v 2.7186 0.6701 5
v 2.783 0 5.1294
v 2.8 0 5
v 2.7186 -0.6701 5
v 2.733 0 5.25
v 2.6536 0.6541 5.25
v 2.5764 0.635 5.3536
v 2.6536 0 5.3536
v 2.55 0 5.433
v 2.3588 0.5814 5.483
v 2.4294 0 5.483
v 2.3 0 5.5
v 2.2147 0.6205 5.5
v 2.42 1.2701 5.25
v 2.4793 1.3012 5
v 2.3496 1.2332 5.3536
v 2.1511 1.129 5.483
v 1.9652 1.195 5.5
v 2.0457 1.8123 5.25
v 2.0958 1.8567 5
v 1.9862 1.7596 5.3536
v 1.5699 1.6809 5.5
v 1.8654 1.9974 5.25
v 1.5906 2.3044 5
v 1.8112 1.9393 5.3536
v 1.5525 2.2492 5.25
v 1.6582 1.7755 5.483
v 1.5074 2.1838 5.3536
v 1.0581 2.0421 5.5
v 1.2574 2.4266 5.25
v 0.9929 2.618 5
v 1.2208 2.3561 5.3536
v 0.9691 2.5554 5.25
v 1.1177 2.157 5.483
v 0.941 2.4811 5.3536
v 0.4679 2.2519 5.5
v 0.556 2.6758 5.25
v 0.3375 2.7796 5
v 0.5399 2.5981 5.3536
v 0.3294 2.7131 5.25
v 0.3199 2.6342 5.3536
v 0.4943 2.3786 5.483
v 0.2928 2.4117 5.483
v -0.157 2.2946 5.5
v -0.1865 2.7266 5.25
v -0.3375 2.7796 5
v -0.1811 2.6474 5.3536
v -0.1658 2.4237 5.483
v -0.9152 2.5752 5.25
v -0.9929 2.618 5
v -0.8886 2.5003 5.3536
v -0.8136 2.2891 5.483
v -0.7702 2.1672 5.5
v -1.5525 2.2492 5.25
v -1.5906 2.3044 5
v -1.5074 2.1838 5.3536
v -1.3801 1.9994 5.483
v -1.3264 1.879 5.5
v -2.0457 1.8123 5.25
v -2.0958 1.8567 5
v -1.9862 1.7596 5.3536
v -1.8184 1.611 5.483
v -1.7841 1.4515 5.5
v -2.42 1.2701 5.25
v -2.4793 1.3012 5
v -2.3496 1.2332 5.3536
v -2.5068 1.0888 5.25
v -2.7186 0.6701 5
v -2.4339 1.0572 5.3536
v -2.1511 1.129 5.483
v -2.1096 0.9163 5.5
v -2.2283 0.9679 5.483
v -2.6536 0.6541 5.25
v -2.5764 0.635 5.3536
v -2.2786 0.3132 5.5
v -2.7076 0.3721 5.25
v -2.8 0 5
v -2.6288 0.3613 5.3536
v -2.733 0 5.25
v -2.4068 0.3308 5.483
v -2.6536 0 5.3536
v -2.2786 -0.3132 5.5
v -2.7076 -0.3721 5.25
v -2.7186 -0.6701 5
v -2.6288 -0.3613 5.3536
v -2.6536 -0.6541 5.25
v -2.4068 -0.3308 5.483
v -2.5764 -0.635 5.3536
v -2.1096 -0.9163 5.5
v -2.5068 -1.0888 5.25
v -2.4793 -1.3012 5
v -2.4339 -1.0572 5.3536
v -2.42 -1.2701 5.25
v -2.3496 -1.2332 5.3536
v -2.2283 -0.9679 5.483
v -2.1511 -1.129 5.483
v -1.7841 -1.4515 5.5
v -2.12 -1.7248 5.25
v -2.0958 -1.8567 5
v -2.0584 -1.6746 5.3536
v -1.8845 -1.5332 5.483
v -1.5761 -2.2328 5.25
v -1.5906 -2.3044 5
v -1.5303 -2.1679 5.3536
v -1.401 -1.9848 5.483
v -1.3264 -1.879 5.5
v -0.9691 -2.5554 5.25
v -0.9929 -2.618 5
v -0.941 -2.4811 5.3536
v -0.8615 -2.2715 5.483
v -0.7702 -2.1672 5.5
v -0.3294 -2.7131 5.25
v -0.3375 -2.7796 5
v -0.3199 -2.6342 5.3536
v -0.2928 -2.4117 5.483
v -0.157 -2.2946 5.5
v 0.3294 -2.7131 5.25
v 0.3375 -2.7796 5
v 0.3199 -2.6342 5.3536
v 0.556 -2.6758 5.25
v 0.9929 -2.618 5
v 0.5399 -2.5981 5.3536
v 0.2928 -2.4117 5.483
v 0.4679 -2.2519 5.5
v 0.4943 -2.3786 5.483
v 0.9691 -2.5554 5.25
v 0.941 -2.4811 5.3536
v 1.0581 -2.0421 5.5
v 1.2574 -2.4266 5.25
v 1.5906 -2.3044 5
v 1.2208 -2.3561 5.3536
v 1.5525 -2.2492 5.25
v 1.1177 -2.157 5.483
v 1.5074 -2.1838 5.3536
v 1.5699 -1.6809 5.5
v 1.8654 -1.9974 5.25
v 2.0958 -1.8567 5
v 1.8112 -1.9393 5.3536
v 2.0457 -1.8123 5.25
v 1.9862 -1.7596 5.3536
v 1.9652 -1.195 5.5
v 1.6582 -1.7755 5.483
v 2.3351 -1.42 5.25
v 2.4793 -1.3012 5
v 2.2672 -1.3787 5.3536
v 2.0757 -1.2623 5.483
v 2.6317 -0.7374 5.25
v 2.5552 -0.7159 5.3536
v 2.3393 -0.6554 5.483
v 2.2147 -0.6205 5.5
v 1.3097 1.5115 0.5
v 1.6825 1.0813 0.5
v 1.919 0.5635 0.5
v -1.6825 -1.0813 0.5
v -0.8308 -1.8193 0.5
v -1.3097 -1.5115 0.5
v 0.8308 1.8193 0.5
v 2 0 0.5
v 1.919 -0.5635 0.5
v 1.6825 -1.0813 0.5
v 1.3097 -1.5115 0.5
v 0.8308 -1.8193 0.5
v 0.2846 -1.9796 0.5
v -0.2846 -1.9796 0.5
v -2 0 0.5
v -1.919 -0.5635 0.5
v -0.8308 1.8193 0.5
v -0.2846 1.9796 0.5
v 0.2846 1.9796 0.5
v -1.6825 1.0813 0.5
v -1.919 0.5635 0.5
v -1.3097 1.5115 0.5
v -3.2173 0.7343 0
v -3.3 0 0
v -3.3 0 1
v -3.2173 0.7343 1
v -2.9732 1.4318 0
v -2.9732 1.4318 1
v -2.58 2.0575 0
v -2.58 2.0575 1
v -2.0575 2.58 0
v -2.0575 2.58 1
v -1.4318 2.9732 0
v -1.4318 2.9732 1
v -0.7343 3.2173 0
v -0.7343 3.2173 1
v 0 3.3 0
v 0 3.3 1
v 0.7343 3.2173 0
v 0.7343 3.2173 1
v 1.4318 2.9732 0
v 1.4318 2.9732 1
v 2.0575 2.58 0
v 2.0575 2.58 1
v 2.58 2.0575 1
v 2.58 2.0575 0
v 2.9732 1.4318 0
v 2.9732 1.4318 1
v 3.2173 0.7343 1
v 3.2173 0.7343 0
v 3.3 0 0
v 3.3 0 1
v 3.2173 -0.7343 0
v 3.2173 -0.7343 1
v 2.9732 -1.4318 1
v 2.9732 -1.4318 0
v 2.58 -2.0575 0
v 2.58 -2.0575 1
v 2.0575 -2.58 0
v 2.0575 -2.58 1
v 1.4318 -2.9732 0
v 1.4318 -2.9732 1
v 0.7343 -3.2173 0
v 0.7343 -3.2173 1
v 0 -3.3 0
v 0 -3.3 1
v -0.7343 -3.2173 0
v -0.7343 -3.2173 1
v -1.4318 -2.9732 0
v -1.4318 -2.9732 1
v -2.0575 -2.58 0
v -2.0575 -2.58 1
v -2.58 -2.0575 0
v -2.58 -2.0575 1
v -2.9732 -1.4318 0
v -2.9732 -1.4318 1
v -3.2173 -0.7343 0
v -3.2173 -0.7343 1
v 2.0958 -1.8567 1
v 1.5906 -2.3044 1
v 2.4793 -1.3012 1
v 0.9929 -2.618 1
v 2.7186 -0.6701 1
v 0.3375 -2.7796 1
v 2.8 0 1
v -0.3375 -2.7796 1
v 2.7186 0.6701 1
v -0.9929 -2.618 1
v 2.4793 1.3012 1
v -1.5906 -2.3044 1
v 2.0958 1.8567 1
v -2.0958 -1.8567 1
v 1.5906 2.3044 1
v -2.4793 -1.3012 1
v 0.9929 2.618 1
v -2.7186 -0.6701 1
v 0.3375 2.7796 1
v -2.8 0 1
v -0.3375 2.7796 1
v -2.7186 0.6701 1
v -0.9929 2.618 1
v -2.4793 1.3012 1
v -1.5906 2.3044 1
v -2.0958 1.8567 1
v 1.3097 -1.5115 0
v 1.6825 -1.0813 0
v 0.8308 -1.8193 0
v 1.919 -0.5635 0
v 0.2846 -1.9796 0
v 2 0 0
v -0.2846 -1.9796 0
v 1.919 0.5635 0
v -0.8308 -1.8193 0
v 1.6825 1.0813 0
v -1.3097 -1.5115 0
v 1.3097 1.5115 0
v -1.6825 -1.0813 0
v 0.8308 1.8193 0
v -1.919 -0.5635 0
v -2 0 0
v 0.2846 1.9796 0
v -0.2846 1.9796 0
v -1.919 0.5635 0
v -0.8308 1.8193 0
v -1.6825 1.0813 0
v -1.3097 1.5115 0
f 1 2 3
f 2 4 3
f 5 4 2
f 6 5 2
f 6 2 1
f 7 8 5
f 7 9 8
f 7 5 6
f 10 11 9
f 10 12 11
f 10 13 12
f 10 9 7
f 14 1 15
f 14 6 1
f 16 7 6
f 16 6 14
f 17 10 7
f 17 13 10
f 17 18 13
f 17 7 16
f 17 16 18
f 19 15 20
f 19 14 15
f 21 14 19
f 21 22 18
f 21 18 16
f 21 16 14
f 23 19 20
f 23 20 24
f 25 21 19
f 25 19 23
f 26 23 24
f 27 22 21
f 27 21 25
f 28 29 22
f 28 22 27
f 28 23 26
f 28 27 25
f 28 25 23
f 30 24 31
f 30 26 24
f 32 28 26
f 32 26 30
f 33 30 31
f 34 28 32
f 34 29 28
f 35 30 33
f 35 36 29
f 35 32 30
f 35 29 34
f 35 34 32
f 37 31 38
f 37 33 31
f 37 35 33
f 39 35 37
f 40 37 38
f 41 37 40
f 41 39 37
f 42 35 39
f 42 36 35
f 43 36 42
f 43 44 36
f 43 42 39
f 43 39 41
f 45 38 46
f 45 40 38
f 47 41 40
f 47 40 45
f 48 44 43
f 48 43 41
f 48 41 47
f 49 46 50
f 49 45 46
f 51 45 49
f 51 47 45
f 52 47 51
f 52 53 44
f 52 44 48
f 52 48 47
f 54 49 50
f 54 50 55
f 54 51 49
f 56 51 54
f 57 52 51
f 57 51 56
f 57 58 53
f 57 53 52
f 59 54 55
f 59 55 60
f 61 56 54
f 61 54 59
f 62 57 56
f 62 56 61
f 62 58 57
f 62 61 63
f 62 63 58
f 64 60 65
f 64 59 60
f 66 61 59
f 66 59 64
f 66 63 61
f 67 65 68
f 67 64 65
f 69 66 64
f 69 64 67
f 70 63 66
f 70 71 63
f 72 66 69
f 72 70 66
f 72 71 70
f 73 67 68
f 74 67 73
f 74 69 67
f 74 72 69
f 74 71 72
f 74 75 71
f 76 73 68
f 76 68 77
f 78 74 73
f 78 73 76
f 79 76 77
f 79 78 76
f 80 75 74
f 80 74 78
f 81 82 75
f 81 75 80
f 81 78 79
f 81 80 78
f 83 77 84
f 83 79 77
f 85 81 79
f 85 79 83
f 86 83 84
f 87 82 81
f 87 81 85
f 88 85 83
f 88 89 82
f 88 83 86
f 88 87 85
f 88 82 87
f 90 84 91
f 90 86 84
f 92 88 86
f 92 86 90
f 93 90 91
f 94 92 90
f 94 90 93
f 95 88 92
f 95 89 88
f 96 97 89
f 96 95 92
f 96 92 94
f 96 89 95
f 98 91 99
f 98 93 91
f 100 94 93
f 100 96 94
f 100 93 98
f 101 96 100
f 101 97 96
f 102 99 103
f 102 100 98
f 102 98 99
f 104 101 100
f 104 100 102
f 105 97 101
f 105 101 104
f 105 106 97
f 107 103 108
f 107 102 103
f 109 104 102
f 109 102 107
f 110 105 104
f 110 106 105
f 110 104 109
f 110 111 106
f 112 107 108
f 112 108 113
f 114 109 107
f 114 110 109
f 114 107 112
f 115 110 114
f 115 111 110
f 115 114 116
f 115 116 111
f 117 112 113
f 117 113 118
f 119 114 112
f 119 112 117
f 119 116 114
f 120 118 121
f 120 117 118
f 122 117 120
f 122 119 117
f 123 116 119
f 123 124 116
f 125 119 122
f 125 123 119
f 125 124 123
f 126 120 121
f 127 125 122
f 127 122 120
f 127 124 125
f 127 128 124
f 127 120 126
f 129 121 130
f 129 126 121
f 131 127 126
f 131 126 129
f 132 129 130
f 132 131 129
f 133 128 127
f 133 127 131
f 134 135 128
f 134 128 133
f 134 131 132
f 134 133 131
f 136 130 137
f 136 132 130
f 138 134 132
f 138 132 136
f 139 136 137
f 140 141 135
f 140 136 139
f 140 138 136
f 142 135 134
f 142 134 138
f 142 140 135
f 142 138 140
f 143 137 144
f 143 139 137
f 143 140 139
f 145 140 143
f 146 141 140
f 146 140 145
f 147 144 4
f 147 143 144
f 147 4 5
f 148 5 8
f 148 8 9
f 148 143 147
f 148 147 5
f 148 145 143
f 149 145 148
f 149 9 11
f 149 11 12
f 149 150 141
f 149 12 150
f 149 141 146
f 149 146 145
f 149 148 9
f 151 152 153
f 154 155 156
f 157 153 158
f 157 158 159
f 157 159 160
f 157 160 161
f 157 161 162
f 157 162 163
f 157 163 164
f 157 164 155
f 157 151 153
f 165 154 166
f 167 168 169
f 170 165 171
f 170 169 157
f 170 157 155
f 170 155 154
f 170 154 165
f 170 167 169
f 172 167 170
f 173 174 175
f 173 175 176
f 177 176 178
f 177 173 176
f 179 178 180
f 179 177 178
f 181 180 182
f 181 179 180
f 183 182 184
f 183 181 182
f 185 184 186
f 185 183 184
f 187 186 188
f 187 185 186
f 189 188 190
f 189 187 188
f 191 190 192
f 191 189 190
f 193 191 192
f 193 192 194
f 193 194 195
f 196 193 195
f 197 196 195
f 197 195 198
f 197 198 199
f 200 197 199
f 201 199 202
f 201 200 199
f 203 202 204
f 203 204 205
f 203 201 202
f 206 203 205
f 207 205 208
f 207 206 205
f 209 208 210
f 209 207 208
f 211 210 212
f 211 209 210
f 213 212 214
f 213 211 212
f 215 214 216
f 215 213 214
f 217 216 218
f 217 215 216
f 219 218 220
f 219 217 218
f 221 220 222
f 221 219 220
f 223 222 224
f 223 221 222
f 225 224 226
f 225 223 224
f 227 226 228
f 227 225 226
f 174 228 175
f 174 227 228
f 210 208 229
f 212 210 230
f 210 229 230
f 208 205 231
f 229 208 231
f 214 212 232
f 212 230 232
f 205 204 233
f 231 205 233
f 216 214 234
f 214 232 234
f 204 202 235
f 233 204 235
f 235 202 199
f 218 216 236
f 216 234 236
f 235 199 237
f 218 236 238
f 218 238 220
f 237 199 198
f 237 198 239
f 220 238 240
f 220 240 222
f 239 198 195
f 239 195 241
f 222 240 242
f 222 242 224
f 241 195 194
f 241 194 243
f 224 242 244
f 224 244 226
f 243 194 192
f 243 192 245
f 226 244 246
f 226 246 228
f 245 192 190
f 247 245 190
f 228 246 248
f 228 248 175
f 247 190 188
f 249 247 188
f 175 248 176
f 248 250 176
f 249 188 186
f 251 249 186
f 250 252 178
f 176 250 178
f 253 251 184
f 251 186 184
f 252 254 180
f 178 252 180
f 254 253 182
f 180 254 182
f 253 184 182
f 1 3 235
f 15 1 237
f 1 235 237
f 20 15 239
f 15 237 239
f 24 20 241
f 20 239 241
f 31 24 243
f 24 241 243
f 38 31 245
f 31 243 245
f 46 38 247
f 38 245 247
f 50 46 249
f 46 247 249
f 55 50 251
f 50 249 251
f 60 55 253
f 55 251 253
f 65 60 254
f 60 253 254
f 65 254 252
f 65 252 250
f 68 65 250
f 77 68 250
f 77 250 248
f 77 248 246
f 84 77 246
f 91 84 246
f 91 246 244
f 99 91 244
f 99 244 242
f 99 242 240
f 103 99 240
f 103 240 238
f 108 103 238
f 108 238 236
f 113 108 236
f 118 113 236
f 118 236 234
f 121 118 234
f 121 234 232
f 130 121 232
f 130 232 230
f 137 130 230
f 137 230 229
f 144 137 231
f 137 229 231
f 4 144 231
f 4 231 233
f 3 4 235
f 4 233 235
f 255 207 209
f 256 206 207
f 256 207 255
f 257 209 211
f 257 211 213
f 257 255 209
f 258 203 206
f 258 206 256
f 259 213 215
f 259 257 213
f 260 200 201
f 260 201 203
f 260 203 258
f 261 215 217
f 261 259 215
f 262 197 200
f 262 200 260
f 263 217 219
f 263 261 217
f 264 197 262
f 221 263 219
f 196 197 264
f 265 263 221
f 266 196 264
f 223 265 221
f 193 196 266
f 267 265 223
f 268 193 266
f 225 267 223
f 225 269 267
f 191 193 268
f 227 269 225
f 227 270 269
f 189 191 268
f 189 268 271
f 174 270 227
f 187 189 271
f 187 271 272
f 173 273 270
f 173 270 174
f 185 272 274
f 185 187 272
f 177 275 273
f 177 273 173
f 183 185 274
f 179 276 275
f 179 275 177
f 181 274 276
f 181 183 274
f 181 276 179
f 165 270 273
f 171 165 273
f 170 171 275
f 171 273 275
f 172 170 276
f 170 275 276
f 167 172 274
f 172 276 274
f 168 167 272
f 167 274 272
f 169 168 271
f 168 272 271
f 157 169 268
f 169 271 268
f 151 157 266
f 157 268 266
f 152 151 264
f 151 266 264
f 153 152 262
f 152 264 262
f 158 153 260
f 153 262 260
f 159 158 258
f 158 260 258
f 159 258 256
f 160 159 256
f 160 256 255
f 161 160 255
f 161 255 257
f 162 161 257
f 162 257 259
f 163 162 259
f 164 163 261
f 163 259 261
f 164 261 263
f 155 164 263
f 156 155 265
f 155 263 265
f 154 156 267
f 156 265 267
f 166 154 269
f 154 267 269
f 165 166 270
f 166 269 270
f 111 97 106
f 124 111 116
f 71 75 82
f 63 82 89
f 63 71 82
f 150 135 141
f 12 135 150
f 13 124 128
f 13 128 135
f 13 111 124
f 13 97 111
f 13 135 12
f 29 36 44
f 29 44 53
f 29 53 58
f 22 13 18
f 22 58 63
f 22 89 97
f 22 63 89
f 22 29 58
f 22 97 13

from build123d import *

# Parameters (mm, degrees)
SKETCH_1_R          = 2.8
EXTRUDE_1_DEPTH     = 5.5
SKETCH_2_R          = 3.3
EXTRUDE_2_DEPTH     = 1
SKETCH_3_R          = 2
CUT_EXTRUDE_1_DEPTH = 0.5
FILLET_1_R          = 0.5


with BuildPart() as part:
    # 草图1 → 凸台-拉伸1 (new body)
    with BuildSketch(Plane.XY):
        Circle(SKETCH_1_R)
    extrude(amount=EXTRUDE_1_DEPTH)

    # 草图2 → 凸台-拉伸2 (add)
    with BuildSketch(Plane(origin=(0, 0, 0), x_dir=(-1, 0, 0), z_dir=(0, 0, -1))):
        Circle(SKETCH_2_R)
    extrude(amount=-EXTRUDE_2_DEPTH)

    # 草图3 → 切除-拉伸1 (cut)
    with BuildSketch(Plane(origin=(0, 0, 0), x_dir=(-1, 0, 0), z_dir=(0, 0, -1))):
        Circle(SKETCH_3_R)
    extrude(amount=-CUT_EXTRUDE_1_DEPTH, mode=Mode.SUBTRACT)

    # 圆角1
    fillet_1_edges = [part.edges().sort_by_distance(p)[0] for p in [
        (-2.8, 0, 5.5),
    ]]
    fillet(fillet_1_edges, radius=FILLET_1_R)


solid = part.part
